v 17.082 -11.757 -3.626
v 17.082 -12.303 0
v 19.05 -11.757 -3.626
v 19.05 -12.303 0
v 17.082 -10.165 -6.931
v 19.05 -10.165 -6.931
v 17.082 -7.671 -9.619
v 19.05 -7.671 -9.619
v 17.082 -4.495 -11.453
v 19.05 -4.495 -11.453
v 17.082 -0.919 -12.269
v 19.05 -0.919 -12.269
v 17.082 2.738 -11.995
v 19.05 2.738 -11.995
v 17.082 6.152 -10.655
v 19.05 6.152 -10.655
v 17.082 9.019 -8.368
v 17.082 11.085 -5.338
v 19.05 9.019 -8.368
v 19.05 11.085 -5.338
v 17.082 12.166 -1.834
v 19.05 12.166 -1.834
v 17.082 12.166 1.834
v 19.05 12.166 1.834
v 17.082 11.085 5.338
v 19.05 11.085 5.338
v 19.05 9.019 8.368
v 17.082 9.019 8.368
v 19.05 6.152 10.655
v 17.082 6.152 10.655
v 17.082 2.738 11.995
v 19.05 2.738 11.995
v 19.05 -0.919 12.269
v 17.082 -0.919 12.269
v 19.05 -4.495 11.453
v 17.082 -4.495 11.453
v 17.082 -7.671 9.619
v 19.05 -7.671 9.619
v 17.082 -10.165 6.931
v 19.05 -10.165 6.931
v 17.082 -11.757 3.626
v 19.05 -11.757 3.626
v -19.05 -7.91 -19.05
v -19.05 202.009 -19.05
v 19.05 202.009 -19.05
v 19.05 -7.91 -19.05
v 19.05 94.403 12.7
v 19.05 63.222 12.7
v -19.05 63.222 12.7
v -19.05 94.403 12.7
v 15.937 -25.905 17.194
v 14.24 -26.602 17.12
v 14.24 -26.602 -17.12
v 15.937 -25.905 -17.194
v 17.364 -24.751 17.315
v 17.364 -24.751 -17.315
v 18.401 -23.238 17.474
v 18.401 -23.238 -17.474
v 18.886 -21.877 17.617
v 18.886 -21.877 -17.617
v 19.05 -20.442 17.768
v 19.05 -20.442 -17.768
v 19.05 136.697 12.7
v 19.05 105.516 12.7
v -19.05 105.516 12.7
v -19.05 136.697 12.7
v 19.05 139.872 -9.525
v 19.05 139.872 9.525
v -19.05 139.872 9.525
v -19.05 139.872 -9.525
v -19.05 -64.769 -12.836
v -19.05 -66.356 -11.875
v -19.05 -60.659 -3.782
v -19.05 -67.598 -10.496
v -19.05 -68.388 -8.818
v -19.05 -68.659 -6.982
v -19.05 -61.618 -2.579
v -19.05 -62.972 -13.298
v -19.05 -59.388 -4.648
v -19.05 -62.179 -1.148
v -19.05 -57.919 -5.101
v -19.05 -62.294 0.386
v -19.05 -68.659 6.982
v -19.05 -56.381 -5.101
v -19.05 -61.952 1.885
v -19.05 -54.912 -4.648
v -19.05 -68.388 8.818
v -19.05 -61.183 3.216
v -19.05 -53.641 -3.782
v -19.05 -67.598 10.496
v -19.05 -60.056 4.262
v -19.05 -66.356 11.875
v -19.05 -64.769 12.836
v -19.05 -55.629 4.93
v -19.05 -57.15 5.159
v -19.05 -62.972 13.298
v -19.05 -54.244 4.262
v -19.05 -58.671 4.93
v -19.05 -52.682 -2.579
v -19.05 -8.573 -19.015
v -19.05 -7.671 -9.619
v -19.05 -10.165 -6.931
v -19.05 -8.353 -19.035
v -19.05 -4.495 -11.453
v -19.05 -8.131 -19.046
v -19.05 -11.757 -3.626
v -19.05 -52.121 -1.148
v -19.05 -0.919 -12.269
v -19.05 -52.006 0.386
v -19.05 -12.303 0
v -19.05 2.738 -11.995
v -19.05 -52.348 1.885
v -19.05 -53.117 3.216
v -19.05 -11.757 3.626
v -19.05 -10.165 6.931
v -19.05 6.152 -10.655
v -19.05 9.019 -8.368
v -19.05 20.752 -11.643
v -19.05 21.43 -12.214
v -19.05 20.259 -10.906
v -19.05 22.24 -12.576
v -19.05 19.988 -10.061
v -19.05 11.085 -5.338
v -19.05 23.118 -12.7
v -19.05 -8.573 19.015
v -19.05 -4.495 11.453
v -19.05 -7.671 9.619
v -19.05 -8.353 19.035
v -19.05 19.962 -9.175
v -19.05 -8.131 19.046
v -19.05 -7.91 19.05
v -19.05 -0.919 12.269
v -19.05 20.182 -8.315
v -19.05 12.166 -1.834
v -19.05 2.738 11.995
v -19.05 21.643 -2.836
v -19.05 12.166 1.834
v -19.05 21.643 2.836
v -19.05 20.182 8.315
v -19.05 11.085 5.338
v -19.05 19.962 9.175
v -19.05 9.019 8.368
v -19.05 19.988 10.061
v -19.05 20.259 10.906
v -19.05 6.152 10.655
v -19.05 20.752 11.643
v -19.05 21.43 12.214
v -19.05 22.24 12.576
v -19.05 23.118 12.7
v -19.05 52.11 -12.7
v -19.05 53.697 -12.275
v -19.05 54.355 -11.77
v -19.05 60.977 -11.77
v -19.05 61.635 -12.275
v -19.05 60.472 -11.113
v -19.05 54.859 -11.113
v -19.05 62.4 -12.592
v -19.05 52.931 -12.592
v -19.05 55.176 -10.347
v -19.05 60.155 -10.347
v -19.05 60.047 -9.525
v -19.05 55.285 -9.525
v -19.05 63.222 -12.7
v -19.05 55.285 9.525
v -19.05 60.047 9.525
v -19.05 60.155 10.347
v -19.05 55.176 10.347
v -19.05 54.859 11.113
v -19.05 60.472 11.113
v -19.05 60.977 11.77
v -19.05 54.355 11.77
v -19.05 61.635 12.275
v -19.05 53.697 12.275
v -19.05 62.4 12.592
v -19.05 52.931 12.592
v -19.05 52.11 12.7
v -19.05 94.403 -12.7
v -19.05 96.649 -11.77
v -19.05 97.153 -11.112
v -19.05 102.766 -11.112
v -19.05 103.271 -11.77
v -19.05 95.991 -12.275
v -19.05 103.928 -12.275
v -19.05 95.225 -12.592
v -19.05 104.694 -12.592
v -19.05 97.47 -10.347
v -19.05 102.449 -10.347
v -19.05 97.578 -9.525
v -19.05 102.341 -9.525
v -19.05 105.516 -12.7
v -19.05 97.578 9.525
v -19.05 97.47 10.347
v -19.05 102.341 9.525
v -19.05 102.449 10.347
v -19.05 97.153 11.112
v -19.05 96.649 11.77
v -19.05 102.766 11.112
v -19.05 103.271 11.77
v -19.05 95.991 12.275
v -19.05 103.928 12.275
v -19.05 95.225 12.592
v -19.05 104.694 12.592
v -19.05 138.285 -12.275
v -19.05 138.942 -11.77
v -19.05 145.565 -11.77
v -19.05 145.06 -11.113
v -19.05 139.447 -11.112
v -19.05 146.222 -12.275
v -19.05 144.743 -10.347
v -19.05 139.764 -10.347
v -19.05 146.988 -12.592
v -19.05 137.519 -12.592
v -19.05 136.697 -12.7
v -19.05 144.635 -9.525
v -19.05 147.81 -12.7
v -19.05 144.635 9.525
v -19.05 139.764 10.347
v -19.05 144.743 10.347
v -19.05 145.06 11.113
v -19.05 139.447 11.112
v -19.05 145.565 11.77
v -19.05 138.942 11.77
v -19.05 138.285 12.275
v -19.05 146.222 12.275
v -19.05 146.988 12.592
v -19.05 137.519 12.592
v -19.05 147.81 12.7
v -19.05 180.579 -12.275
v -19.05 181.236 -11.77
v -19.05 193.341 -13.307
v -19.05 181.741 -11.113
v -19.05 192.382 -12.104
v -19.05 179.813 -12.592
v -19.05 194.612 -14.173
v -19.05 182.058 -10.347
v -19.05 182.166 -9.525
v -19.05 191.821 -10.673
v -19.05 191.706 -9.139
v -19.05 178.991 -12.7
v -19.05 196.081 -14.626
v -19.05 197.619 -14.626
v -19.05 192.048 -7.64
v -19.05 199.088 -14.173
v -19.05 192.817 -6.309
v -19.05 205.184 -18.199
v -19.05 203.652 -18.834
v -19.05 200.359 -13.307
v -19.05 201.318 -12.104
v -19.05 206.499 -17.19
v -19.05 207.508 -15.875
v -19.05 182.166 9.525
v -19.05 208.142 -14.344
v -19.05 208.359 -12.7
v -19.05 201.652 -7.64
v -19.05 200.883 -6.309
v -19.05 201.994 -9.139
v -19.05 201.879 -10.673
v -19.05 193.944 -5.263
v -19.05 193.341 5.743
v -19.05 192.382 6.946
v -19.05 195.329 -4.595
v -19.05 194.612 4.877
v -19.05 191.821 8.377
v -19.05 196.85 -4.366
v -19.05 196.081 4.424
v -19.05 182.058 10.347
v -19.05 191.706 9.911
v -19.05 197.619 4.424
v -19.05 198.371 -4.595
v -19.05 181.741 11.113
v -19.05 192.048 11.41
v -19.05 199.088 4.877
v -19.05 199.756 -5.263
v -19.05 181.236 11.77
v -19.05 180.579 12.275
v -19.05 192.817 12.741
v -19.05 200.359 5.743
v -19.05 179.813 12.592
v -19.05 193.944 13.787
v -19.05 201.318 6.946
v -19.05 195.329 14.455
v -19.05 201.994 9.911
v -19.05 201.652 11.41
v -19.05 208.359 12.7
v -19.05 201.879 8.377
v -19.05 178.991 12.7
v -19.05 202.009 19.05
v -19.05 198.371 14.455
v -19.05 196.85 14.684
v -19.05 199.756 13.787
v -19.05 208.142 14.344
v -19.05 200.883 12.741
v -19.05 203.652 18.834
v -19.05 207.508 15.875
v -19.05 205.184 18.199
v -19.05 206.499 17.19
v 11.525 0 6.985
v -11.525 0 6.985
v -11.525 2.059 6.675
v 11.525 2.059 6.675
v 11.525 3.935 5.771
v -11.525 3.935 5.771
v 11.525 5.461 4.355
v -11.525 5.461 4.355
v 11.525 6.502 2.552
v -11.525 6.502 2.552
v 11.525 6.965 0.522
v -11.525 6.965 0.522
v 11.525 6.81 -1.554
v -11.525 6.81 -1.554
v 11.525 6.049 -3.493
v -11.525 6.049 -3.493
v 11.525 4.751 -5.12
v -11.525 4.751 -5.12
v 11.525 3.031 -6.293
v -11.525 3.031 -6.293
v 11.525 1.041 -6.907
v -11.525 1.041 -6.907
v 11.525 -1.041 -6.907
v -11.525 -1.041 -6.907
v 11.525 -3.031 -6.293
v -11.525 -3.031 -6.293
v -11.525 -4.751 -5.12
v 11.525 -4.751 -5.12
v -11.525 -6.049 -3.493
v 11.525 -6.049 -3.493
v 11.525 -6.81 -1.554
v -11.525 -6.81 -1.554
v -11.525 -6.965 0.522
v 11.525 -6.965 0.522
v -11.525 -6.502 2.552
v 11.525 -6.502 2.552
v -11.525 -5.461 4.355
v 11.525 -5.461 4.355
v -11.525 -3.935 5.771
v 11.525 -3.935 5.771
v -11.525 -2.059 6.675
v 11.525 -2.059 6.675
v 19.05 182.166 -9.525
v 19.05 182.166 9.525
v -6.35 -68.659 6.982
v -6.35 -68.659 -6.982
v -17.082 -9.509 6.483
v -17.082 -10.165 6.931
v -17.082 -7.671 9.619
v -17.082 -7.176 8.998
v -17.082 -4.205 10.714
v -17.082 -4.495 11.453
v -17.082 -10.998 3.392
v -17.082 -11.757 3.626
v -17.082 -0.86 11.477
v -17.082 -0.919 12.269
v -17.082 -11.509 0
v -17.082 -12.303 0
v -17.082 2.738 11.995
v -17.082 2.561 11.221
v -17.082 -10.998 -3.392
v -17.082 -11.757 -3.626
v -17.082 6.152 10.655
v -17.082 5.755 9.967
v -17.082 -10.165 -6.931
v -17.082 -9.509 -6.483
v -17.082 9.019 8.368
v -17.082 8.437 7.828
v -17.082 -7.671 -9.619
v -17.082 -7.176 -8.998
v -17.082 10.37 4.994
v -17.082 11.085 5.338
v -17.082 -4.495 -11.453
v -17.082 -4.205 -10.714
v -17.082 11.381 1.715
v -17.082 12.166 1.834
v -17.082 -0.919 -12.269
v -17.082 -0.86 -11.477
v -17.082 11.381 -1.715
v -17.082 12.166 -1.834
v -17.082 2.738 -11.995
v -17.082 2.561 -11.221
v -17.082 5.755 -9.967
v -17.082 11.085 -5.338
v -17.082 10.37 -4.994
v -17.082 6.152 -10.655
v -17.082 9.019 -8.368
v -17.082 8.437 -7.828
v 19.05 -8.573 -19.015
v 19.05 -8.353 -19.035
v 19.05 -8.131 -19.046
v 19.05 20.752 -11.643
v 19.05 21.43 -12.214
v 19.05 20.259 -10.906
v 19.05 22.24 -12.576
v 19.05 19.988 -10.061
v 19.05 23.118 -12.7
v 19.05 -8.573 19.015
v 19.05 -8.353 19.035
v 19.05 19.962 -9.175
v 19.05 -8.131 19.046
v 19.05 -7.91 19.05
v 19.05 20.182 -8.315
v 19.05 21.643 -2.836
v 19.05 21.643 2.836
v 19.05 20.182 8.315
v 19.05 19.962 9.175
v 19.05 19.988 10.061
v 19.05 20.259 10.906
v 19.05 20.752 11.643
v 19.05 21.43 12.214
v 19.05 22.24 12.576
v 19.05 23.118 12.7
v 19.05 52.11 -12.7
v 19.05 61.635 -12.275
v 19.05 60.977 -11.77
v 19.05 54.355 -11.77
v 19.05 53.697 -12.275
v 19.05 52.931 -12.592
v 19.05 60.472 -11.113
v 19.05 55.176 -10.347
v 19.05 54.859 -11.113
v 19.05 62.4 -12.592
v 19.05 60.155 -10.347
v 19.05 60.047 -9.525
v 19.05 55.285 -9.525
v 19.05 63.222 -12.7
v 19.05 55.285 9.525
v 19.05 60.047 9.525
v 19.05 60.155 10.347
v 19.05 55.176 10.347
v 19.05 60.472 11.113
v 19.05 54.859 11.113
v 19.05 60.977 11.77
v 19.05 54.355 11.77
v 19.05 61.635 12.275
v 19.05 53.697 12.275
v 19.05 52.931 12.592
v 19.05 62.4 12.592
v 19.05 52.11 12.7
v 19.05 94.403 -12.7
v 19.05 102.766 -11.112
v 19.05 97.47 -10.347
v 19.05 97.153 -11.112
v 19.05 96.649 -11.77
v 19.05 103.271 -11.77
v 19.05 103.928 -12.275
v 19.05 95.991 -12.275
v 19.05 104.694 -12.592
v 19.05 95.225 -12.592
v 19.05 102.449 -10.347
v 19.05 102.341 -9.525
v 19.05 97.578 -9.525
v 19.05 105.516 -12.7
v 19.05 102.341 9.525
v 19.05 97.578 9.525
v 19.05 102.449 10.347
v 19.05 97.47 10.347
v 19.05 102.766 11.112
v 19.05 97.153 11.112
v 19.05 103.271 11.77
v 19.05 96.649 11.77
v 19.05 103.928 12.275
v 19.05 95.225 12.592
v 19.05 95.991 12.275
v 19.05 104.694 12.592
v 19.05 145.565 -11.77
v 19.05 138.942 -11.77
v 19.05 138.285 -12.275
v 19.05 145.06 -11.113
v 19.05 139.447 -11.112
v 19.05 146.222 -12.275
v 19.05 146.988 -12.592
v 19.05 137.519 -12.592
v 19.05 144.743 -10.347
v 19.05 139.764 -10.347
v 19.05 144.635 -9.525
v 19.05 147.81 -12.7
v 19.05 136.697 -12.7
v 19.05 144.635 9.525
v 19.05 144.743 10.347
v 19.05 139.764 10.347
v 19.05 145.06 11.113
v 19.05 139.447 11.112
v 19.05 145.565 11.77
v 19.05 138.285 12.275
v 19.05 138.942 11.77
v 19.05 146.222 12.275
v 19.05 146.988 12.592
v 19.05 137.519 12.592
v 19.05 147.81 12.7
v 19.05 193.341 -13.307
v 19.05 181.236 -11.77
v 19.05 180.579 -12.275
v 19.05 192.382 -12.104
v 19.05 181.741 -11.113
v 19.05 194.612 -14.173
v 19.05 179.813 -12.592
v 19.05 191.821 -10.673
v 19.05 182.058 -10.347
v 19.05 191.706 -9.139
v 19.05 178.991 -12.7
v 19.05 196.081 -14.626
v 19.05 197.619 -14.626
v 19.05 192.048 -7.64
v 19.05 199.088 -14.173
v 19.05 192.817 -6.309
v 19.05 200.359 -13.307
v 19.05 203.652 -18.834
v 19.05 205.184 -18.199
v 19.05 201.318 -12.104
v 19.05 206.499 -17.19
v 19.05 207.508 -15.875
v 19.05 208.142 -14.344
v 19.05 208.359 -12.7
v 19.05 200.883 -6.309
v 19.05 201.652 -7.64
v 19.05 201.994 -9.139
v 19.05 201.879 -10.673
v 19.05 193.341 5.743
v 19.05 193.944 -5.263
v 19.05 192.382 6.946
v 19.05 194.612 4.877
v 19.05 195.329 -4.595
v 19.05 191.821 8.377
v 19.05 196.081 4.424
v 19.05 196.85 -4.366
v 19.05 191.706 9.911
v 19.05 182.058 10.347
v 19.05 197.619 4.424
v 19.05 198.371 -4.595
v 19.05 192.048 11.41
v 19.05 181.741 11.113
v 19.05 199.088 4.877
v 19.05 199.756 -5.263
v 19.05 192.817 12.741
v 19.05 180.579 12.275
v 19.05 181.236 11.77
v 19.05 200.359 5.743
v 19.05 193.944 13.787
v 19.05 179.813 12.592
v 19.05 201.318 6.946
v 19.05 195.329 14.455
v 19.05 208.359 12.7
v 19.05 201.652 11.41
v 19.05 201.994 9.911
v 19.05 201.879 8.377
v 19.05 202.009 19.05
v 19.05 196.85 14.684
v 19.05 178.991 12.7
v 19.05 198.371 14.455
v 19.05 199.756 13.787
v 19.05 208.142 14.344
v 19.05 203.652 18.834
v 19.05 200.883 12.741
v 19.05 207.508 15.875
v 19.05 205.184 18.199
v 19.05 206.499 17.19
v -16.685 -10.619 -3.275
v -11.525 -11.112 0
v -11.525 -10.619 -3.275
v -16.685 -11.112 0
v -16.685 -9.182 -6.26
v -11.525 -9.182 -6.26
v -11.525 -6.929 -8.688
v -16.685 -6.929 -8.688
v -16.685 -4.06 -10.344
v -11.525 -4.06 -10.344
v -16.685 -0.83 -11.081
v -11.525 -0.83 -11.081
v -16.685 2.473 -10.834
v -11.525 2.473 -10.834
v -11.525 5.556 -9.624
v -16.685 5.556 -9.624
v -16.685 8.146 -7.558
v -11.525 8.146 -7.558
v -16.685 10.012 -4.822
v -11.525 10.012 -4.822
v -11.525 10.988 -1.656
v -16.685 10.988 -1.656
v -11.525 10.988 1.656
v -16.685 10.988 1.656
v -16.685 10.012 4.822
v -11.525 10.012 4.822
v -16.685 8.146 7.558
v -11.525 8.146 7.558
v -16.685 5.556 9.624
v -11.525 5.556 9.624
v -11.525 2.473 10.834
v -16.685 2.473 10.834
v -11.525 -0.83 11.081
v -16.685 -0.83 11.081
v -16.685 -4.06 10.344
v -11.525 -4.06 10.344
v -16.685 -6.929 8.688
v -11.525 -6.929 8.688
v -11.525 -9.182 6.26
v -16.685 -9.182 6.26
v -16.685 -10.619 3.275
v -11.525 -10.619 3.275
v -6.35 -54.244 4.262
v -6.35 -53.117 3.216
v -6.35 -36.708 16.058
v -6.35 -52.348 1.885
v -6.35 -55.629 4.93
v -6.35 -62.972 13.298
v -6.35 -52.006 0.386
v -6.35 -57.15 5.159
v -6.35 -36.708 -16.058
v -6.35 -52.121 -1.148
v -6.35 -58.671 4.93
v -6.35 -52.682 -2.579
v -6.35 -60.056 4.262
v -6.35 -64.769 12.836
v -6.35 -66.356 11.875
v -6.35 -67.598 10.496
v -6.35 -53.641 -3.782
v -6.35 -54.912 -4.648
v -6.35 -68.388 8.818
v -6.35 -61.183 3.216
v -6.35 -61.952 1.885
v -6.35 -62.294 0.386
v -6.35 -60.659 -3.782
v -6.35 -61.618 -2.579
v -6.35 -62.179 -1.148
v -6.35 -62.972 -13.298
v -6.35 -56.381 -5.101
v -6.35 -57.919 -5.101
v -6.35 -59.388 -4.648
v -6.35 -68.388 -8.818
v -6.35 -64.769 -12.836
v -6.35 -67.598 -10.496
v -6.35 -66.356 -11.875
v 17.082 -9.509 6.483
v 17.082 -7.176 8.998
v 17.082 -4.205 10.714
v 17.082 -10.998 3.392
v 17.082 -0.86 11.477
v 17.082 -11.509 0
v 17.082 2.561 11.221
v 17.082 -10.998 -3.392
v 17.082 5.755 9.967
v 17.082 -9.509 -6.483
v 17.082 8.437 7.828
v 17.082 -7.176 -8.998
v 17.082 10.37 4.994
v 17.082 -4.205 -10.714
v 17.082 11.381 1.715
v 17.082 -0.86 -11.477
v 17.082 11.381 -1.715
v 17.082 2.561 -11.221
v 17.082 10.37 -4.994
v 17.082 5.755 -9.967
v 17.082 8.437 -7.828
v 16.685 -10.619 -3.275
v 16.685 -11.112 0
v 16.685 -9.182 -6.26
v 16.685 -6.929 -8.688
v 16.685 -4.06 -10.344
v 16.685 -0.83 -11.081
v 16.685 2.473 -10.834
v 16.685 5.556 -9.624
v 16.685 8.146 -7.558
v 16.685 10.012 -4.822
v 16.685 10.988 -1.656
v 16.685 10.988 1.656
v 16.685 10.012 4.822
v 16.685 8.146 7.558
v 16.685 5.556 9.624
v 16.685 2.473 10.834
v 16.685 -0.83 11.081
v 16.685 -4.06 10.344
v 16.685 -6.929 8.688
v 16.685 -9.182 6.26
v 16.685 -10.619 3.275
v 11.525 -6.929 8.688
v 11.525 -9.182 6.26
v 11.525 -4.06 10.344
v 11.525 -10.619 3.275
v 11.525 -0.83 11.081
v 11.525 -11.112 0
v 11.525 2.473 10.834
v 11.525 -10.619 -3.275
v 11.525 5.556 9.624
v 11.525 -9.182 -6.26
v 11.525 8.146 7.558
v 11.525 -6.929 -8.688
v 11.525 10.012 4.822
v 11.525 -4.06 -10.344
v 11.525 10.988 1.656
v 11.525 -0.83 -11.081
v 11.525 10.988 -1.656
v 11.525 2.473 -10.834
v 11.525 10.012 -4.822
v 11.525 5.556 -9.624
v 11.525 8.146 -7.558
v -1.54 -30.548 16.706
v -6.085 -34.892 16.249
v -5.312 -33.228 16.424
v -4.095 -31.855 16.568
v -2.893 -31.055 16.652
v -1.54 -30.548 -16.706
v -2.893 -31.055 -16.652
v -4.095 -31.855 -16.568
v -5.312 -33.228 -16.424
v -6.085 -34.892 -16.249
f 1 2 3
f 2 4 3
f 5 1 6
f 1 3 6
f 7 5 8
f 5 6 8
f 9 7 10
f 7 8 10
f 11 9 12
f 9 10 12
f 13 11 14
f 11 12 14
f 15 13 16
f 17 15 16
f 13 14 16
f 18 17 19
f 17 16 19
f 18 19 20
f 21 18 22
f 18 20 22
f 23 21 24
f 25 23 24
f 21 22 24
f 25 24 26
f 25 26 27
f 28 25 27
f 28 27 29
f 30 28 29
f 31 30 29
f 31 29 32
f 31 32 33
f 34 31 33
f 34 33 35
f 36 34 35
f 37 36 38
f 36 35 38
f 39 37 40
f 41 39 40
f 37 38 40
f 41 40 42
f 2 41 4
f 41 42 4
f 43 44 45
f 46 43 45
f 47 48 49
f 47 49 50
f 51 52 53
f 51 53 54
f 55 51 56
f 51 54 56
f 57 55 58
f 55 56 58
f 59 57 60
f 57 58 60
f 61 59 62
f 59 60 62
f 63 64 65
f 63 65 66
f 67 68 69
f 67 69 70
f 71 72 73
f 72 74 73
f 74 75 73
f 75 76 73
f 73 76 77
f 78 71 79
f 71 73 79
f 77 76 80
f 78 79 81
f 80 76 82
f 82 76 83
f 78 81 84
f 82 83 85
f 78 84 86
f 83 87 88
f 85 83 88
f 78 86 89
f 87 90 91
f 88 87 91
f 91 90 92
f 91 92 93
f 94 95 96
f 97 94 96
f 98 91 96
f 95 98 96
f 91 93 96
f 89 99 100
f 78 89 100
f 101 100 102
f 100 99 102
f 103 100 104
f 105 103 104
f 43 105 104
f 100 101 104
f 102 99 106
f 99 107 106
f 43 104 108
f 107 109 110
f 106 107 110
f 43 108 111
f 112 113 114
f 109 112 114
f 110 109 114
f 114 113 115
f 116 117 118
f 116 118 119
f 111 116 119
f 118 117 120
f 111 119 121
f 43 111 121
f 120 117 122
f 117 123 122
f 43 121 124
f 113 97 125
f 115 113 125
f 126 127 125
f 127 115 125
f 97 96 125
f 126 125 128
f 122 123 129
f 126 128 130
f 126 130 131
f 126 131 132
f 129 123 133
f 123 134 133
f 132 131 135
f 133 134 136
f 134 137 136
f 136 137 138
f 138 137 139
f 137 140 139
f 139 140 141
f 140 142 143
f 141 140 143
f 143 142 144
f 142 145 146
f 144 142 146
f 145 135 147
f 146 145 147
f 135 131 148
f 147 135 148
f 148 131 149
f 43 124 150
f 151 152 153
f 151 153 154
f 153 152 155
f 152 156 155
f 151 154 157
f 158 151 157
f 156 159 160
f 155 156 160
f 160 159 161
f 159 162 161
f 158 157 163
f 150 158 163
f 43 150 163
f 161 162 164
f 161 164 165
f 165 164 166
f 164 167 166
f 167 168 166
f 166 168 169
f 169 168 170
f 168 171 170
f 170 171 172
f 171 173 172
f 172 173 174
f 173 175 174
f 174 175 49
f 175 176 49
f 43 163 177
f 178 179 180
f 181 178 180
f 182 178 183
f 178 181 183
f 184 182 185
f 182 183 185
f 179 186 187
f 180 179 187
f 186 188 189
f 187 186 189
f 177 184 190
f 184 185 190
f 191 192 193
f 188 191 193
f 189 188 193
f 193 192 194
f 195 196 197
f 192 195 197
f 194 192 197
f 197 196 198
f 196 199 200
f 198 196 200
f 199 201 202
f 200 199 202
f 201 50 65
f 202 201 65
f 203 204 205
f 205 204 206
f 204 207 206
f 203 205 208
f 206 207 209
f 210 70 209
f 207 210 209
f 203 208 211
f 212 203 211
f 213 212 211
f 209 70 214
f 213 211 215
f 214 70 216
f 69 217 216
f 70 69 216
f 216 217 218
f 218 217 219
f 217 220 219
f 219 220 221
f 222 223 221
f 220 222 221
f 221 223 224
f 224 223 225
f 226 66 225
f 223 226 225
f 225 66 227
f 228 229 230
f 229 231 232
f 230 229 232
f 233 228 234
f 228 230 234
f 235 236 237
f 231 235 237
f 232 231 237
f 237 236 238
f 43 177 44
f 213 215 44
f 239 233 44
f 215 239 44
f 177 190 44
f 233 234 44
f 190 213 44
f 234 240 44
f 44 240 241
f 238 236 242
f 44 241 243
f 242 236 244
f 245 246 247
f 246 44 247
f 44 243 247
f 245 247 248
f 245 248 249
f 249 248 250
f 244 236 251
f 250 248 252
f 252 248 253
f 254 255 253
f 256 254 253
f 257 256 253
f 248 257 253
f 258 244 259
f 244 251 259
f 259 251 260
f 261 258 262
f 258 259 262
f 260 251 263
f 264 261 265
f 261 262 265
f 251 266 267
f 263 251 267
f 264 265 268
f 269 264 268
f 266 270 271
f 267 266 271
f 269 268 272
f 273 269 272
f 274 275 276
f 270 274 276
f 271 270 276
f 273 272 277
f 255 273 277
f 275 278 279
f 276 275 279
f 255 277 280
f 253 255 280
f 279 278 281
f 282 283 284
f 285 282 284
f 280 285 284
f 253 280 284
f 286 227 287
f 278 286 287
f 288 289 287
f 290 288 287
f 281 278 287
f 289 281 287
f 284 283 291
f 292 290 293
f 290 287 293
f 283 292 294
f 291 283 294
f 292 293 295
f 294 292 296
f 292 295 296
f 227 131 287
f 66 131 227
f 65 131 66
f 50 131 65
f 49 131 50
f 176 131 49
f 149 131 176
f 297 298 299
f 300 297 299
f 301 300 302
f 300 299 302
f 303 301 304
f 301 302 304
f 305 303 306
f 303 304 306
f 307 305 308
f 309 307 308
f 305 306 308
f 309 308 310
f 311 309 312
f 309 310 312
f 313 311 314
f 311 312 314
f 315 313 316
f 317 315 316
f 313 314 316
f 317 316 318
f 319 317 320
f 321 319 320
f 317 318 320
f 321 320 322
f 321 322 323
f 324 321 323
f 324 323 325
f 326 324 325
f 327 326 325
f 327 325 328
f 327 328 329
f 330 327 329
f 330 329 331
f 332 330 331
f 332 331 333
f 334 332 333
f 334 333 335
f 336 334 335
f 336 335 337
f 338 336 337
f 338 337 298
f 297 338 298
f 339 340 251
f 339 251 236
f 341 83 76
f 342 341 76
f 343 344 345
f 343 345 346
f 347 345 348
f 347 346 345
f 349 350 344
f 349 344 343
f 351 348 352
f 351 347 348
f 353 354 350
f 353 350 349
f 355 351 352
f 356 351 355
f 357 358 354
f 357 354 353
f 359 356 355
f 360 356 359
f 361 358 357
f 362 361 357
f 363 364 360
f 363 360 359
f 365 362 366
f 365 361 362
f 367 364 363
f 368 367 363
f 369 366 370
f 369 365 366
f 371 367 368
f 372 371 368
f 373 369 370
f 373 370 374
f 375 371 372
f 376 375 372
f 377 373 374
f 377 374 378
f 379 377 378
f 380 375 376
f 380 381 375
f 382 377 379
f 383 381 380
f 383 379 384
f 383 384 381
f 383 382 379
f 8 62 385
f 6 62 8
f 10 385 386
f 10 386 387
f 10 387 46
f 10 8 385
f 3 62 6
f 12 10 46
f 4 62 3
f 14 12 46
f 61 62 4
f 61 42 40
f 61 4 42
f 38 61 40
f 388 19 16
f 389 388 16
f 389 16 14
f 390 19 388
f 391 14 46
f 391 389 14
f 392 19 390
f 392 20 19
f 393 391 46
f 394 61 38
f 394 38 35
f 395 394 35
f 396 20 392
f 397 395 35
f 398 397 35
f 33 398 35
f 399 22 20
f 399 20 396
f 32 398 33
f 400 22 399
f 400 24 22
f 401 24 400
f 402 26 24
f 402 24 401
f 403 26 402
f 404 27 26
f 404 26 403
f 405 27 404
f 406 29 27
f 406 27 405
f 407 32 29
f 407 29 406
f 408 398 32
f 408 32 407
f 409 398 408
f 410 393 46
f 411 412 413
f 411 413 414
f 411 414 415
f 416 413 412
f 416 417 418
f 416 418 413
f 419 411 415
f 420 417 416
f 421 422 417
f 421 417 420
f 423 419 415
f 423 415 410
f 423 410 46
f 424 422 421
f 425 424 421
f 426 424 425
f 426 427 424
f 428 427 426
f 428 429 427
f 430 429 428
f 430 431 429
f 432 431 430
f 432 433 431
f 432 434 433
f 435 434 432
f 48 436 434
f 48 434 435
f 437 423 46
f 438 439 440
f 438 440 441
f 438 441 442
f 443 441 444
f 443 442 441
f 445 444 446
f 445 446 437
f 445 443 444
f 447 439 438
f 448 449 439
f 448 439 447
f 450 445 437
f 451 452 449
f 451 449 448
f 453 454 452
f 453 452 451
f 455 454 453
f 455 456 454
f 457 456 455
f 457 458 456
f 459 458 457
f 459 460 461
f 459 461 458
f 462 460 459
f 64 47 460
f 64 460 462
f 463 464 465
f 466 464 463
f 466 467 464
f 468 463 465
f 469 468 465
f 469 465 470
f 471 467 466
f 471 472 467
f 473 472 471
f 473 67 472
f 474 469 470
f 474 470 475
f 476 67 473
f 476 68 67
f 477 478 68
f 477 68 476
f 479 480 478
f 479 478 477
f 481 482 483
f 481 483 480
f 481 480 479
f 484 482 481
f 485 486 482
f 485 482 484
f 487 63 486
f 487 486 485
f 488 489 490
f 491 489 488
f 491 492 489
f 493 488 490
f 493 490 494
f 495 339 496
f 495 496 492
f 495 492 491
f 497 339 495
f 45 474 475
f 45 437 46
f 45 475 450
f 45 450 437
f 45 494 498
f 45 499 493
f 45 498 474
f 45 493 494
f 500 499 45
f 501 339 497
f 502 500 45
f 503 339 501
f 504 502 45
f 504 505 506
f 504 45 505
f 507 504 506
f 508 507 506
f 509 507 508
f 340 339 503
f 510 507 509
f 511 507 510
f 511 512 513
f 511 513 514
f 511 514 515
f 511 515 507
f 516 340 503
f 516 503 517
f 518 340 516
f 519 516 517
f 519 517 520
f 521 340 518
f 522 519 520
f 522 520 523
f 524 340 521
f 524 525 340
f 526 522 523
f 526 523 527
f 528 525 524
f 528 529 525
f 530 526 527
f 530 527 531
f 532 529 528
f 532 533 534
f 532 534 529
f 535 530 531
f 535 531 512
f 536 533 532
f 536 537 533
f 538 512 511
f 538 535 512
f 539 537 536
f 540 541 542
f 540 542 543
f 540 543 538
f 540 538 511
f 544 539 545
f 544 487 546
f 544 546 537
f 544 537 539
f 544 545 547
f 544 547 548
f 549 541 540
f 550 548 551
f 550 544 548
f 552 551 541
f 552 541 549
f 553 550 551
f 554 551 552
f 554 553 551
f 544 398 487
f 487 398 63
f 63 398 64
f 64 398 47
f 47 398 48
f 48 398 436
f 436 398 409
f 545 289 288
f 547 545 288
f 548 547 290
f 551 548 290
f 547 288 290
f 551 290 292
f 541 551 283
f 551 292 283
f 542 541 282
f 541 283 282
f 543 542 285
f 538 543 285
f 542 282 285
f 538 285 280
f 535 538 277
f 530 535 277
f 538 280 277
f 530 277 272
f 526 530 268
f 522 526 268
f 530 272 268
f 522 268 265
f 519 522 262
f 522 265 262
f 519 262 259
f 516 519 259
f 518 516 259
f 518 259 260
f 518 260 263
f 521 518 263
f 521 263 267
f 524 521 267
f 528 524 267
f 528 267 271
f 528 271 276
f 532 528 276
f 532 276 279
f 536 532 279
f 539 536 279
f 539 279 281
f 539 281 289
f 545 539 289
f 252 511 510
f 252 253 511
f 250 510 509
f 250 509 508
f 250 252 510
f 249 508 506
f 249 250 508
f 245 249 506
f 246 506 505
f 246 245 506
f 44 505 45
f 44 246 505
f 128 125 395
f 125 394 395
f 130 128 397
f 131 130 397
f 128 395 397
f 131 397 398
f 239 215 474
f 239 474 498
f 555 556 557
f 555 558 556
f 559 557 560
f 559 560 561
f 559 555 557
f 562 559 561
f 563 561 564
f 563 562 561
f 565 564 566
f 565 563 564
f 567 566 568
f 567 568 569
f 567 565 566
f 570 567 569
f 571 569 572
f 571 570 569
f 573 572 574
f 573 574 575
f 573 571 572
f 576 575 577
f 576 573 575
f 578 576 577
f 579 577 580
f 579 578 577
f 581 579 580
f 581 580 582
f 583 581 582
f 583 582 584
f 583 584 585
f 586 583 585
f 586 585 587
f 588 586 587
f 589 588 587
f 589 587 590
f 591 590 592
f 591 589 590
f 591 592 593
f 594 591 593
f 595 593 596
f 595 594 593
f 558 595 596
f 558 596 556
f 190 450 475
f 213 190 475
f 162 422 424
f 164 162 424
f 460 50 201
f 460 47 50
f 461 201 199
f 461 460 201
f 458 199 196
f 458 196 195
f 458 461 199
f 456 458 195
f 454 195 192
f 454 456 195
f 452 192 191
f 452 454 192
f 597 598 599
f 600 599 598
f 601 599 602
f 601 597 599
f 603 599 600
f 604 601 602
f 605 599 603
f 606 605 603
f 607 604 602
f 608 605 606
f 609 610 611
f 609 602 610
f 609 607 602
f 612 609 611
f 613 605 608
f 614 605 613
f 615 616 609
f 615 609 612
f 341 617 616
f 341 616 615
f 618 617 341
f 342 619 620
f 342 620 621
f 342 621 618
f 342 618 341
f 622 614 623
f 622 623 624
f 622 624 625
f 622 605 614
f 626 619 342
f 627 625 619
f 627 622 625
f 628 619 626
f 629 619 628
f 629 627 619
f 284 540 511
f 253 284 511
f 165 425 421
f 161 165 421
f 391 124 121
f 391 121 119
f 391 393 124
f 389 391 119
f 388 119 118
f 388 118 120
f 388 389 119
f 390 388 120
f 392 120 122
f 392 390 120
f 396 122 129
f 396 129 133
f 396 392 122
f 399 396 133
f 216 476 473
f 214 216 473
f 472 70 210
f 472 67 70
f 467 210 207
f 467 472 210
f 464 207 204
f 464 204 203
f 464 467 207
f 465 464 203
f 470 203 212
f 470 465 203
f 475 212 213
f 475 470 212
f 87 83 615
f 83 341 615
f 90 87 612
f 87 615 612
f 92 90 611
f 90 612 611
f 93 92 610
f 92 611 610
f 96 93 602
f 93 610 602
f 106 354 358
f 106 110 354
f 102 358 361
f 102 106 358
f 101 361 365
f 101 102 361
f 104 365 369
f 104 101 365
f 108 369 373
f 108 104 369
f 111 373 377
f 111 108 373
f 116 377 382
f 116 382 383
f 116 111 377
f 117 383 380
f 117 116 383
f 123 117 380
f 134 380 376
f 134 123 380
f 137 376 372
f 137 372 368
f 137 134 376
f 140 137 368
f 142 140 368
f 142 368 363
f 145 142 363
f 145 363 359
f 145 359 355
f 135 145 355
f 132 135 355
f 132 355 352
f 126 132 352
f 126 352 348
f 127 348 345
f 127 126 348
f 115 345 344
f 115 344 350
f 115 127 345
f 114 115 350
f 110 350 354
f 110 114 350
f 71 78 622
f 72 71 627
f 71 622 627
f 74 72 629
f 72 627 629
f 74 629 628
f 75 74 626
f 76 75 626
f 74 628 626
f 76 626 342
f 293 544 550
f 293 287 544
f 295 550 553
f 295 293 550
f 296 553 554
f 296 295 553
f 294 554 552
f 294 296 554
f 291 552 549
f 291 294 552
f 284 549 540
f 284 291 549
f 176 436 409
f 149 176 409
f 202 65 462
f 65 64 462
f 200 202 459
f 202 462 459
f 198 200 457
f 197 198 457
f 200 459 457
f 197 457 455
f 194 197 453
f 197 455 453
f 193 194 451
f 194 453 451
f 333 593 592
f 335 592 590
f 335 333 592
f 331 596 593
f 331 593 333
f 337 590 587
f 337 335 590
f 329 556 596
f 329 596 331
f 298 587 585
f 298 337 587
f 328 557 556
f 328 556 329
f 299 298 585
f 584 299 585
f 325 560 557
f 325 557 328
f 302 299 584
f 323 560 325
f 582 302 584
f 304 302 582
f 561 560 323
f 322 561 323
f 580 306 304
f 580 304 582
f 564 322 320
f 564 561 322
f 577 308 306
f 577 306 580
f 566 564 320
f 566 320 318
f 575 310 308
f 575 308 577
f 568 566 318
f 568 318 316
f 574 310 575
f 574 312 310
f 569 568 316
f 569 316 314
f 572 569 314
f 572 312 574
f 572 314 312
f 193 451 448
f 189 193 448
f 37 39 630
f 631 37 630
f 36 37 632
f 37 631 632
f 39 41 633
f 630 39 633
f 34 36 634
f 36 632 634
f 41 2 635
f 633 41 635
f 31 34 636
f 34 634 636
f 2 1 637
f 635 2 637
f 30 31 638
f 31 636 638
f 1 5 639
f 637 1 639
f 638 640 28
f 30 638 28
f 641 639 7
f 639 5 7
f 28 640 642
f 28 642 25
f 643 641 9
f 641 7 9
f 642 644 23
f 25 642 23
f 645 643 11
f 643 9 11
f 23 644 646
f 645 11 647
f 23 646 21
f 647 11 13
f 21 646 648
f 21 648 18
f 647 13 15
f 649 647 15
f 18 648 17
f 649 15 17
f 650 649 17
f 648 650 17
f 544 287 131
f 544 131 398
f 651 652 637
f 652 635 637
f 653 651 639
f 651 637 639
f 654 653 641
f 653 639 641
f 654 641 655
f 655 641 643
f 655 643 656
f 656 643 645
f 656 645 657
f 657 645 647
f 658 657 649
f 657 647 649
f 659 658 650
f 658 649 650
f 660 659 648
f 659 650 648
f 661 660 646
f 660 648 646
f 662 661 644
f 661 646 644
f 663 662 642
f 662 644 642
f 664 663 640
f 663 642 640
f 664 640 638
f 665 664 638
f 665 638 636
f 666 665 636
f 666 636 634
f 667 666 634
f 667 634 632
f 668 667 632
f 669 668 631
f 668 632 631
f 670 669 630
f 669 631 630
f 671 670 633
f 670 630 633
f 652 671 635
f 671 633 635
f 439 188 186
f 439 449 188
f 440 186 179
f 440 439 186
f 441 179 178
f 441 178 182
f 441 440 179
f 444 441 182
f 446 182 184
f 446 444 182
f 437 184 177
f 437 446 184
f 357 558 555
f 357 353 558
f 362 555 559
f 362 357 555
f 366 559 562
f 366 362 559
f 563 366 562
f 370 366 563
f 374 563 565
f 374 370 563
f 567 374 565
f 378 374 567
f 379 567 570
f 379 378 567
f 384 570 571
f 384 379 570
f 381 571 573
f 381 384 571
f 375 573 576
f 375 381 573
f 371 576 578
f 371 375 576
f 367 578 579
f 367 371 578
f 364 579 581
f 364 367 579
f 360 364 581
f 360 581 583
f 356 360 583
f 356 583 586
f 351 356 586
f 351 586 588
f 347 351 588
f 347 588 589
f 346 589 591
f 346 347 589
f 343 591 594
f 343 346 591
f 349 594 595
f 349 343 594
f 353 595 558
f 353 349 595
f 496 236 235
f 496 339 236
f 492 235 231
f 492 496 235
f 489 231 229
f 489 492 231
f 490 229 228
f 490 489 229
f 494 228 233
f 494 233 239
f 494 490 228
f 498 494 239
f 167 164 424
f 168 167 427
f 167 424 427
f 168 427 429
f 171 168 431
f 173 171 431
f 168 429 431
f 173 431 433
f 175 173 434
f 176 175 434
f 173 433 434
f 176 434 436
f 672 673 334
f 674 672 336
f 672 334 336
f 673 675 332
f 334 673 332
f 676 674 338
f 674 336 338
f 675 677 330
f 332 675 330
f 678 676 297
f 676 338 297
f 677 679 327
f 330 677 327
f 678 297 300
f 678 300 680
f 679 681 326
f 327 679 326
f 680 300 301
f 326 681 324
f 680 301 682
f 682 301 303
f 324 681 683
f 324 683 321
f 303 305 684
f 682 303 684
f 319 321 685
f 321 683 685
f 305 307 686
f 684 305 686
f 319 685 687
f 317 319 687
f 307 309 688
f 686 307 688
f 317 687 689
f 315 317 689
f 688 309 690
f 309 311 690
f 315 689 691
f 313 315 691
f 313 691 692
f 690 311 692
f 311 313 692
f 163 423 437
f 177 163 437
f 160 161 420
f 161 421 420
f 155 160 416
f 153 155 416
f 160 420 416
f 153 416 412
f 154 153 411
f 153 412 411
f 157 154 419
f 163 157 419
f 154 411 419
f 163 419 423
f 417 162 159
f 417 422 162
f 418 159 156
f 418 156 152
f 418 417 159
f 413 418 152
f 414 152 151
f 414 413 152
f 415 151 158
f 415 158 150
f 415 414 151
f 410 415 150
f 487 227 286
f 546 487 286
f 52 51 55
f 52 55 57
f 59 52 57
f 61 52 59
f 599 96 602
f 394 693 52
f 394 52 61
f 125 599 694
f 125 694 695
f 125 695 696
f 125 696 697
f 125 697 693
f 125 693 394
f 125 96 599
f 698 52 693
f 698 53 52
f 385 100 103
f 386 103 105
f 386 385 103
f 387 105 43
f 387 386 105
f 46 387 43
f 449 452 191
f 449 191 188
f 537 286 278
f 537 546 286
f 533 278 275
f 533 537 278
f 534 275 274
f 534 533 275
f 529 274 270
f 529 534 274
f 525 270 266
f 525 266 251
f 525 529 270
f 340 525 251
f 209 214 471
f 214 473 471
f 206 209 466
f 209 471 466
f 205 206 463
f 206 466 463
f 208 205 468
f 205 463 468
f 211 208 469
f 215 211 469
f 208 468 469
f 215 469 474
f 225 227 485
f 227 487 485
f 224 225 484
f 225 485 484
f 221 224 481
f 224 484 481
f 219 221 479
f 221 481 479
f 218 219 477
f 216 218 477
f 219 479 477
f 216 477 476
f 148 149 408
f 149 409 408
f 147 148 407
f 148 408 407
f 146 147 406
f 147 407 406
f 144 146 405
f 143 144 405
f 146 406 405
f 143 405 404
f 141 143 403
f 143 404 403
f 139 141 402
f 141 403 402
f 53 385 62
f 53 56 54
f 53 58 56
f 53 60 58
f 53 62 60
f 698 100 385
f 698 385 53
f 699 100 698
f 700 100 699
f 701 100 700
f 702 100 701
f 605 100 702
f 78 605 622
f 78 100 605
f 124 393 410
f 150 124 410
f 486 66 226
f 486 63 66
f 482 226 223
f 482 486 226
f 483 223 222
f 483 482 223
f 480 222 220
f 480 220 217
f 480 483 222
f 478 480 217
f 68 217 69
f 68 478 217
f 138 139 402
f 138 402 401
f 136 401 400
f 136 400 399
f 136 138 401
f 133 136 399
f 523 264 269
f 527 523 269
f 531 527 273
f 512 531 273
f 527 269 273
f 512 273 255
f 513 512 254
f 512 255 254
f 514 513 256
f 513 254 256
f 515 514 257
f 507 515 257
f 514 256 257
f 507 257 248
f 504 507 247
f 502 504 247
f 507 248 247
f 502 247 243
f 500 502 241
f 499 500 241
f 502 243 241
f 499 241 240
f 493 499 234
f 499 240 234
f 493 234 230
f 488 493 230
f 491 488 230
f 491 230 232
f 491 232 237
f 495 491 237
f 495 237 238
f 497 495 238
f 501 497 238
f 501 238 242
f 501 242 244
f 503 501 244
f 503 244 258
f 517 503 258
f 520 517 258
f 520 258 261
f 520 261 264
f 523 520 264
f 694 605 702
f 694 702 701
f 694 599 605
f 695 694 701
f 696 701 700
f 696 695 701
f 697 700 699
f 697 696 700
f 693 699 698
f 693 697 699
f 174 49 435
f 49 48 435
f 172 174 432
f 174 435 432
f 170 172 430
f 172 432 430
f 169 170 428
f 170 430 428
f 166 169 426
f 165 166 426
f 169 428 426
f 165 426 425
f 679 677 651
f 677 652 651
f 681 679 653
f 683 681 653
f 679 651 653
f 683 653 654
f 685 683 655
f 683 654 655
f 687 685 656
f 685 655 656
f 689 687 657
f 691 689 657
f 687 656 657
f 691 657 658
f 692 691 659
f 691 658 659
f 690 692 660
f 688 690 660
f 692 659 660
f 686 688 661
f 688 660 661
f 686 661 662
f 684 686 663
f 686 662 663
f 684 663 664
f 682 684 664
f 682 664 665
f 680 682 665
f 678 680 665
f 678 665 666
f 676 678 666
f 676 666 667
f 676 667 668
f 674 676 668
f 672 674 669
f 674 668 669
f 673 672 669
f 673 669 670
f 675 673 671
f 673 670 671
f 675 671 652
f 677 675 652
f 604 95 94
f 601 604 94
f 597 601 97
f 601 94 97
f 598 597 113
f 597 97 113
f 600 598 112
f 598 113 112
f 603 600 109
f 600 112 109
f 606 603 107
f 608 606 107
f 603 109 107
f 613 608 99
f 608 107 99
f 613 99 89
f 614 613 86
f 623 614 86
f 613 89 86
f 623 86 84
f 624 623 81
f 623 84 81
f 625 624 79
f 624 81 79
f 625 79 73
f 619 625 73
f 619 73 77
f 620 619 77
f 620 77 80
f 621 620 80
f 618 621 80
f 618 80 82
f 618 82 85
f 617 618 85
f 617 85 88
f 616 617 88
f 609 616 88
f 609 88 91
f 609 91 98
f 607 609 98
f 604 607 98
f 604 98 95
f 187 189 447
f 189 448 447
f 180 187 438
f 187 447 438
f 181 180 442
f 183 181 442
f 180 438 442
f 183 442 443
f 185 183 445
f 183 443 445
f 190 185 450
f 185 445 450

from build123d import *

# Parameters (mm, degrees)
SKETCH5_W               = 38.1
SKETCH5_H               = 298.45
BOSS_EXTRUDE2_DEPTH     = 19.05
F_3_8_CLEARANCE_HOLE2_D = 10.31748
F_3_8_CLEARANCE_HOLE4_D = 13.97
BODY_MOVE_COPY4_ANGLE   = 90
F_3_8_CLEARANCE_HOLE3_D = 10.31748
CUT_EXTRUDE1_DEPTH      = 218.574389578
CUT_EXTRUDE1_DEPTH_BACK = 218.574389578
CUT_EXTRUDE2_DEPTH      = 218.574389578
CUT_EXTRUDE2_DEPTH_BACK = 218.574389578
SKETCH12_W              = 25.4
SKETCH12_H              = 37.531383446
SKETCH12_H_2            = 37.531383447
CUT_EXTRUDE3_DEPTH      = 218.574389578
CUT_EXTRUDE3_DEPTH_BACK = 218.574389578
CUT_EXTRUDE5_DEPTH      = 211.093240097
CUT_EXTRUDE5_DEPTH_BACK = 211.093240097
FILLET1_R               = 3.175
FILLET2_R               = 6.35
FILLET3_R               = 6.35


with BuildPart() as part:
    # Sketch5 → Boss-Extrude2 (new, symmetric)
    with BuildSketch(Plane.XY):
        with Locations((0, 66.675)):
            Rectangle(SKETCH5_W, SKETCH5_H)
    extrude(amount=BOSS_EXTRUDE2_DEPTH, both=True)

    # 3/8 Clearance Hole2 (through all)
    with Locations(Plane(origin=(19.05, 0, 0), x_dir=(0, 0, -1), z_dir=(1, 0, 0))):
        with Locations((0, -57.15)):
            Hole(F_3_8_CLEARANCE_HOLE2_D / 2)

    # 3/8 Clearance Hole4 (through all)
    with Locations(Plane(origin=(19.05, 0, 0), x_dir=(0, 0, -1), z_dir=(1, 0, 0))):
        with Locations((0, 0)):
            Hole(F_3_8_CLEARANCE_HOLE4_D / 2)


with BuildPart() as body_2:
    # uxcell-FR6ZZ: read off the stored shape, not the designer's step
    # uxcell-FR6ZZ outline → uxcell-FR6ZZ (revolve)
    with BuildSketch(Plane(origin=(46.870492888, 0, -67.456601715), x_dir=(1, 0, 0), z_dir=(0, 0, 1))):
        Polygon((12.303125, 146.229545606), (4.7625, 146.229545606), (4.7625, 138.704795606), (11.1125, 138.704795606), (11.1125, 143.864170606), (11.509375, 144.261045606), (12.303125, 144.261045606), align=None)
    revolve(axis=Axis((46.870492888, 0, -67.456601715), (0, 1, 0)))


with BuildPart() as body_2_1:
    # Body-Move/Copy4: read off the stored shape, not the designer's step
    # Body-Move/Copy4: moved
    add(body_2.part.moved(Location((-46.8704929, -127.1795456, 67.4566017))).rotate(Axis((0, 0, 0), (0, 0, -1)), BODY_MOVE_COPY4_ANGLE))


with BuildPart() as body_3:
    # Mirror1: mirrored copy
    add(body_2_1.part.mirror(Plane(origin=(0, 0, 0), x_dir=(0, 0, 1), z_dir=(1, 0, 0))))


with BuildPart() as part_1:
    add(part.part)

    # Combine2: cut body 3, body 2
    add(body_3.part, mode=Mode.SUBTRACT)
    add(body_2_1.part, mode=Mode.SUBTRACT)

    # 3/8 Clearance Hole3 (through all)
    with Locations(Plane(origin=(19.05, 0, 0), x_dir=(0, 0, -1), z_dir=(1, 0, 0))):
        with Locations((-9.525, 196.85), (9.525, 196.85)):
            Hole(F_3_8_CLEARANCE_HOLE3_D / 2)

    # Sketch11 → Cut-Extrude1 (cut, two sides: drawn at the far end of the back side and taken through both)
    with BuildSketch(Plane.XY.offset(-CUT_EXTRUDE1_DEPTH_BACK)):
        Polygon((-6.35, -691.607801887), (-6.35, -82.55), (-6.35, -31.75), (19.05, -25.4), (609.922858655, 122.318214664), (1581.067185153, -612.994182394), (964.794326498, -1426.920198945), align=None)
    extrude(amount=CUT_EXTRUDE1_DEPTH + CUT_EXTRUDE1_DEPTH_BACK, mode=Mode.SUBTRACT)

    # Sketch12 → Cut-Extrude2 (cut, two sides: drawn at the far end of the back side and taken through both)
    with BuildSketch(Plane(origin=(0, 0, 0), x_dir=(0, 0, -1), z_dir=(1, 0, 0)).offset(-CUT_EXTRUDE2_DEPTH_BACK)):
        with Locations((0, 163.400568277)):
            Rectangle(SKETCH12_W, SKETCH12_H)
        with Locations((0, 121.106684831)):
            Rectangle(SKETCH12_W, SKETCH12_H_2)
        with Locations((0, 78.812801384)):
            Rectangle(SKETCH12_W, SKETCH12_H)
        with BuildLine():
            Line((12.7, 17.753226214), (12.7, 55.284609661))
            Line((12.7, 55.284609661), (-12.7, 55.284609661))
            Line((-12.7, 55.284609661), (-12.7, 17.753226214))
            ThreePointArc((-12.7, 17.753226214), (0, 21.828125), (12.7, 17.753226214))
        make_face()
    extrude(amount=CUT_EXTRUDE2_DEPTH + CUT_EXTRUDE2_DEPTH_BACK, mode=Mode.SUBTRACT)

    # Sketch16 → Cut-Extrude3 (cut, two sides: drawn at the far end of the back side and taken through both)
    with BuildSketch(Plane(origin=(0, 0, 0), x_dir=(0, 0, -1), z_dir=(1, 0, 0)).offset(-CUT_EXTRUDE3_DEPTH_BACK)):
        Polygon((-615.836179143, 208.35874), (-19.05, 208.35874), (19.05, 208.35874), (615.836179143, 208.35874), (615.836179143, 1401.931098287), (-615.836179143, 1401.931098287), align=None)
    extrude(amount=CUT_EXTRUDE3_DEPTH + CUT_EXTRUDE3_DEPTH_BACK, mode=Mode.SUBTRACT)

    # Sketch18 → Cut-Extrude5 (cut, two sides: drawn at the far end of the back side and taken through both)
    with BuildSketch(Plane(origin=(0, 0, 0), x_dir=(0, 0, -1), z_dir=(1, 0, 0)).offset(-CUT_EXTRUDE5_DEPTH_BACK)):
        Polygon((-66.072467933, 439.146371732), (-19.05, -8.242525716), (-12.7, -68.65874), (12.7, -68.65874), (19.05, -8.242525716), (66.072467933, 439.146371732), (66.072467933, -460.560109405), (-66.072467933, -460.560109405), align=None)
    extrude(amount=CUT_EXTRUDE5_DEPTH + CUT_EXTRUDE5_DEPTH_BACK, mode=Mode.SUBTRACT)

    # Fillet1
    fillet1_edges = [part_1.edges().sort_by_distance(p)[0] for p in [
        (0, 60.047109661, -12.7),
        (0, 60.047109661, 12.7),
        (0, 55.284609661, 12.7),
        (0, 55.284609661, -12.7),
        (0, 17.753226214, -12.7),
        (0, 17.753226214, 12.7),
        (0, 182.16626, -12.7),
        (0, 144.634876554, -12.7),
        (0, 144.634876554, 12.7),
        (0, 182.16626, 12.7),
        (0, 139.872376554, 12.7),
        (0, 139.872376554, -12.7),
        (0, 102.340993107, -12.7),
        (0, 102.340993107, 12.7),
        (0, 97.578493107, 12.7),
        (0, 97.578493107, -12.7),
    ]]
    fillet(fillet1_edges, radius=FILLET1_R)

    # Fillet2
    fillet2_edges = [part_1.edges().sort_by_distance(p)[0] for p in [
        (0, 208.35874, -19.05),
        (0, 208.35874, 19.05),
        (0, -8.242525716, 19.05),
        (-12.7, -68.65874, 12.7),
        (-12.7, -68.65874, -12.7),
        (0, -8.242525716, -19.05),
    ]]
    fillet(fillet2_edges, radius=FILLET2_R)

    # Fillet3
    fillet3_edges = [part_1.edges().sort_by_distance(p)[0] for p in [
        (-6.35, -31.75, 0),
        (19.05, -25.4, 0),
    ]]
    fillet(fillet3_edges, radius=FILLET3_R)


solid = part_1.part
